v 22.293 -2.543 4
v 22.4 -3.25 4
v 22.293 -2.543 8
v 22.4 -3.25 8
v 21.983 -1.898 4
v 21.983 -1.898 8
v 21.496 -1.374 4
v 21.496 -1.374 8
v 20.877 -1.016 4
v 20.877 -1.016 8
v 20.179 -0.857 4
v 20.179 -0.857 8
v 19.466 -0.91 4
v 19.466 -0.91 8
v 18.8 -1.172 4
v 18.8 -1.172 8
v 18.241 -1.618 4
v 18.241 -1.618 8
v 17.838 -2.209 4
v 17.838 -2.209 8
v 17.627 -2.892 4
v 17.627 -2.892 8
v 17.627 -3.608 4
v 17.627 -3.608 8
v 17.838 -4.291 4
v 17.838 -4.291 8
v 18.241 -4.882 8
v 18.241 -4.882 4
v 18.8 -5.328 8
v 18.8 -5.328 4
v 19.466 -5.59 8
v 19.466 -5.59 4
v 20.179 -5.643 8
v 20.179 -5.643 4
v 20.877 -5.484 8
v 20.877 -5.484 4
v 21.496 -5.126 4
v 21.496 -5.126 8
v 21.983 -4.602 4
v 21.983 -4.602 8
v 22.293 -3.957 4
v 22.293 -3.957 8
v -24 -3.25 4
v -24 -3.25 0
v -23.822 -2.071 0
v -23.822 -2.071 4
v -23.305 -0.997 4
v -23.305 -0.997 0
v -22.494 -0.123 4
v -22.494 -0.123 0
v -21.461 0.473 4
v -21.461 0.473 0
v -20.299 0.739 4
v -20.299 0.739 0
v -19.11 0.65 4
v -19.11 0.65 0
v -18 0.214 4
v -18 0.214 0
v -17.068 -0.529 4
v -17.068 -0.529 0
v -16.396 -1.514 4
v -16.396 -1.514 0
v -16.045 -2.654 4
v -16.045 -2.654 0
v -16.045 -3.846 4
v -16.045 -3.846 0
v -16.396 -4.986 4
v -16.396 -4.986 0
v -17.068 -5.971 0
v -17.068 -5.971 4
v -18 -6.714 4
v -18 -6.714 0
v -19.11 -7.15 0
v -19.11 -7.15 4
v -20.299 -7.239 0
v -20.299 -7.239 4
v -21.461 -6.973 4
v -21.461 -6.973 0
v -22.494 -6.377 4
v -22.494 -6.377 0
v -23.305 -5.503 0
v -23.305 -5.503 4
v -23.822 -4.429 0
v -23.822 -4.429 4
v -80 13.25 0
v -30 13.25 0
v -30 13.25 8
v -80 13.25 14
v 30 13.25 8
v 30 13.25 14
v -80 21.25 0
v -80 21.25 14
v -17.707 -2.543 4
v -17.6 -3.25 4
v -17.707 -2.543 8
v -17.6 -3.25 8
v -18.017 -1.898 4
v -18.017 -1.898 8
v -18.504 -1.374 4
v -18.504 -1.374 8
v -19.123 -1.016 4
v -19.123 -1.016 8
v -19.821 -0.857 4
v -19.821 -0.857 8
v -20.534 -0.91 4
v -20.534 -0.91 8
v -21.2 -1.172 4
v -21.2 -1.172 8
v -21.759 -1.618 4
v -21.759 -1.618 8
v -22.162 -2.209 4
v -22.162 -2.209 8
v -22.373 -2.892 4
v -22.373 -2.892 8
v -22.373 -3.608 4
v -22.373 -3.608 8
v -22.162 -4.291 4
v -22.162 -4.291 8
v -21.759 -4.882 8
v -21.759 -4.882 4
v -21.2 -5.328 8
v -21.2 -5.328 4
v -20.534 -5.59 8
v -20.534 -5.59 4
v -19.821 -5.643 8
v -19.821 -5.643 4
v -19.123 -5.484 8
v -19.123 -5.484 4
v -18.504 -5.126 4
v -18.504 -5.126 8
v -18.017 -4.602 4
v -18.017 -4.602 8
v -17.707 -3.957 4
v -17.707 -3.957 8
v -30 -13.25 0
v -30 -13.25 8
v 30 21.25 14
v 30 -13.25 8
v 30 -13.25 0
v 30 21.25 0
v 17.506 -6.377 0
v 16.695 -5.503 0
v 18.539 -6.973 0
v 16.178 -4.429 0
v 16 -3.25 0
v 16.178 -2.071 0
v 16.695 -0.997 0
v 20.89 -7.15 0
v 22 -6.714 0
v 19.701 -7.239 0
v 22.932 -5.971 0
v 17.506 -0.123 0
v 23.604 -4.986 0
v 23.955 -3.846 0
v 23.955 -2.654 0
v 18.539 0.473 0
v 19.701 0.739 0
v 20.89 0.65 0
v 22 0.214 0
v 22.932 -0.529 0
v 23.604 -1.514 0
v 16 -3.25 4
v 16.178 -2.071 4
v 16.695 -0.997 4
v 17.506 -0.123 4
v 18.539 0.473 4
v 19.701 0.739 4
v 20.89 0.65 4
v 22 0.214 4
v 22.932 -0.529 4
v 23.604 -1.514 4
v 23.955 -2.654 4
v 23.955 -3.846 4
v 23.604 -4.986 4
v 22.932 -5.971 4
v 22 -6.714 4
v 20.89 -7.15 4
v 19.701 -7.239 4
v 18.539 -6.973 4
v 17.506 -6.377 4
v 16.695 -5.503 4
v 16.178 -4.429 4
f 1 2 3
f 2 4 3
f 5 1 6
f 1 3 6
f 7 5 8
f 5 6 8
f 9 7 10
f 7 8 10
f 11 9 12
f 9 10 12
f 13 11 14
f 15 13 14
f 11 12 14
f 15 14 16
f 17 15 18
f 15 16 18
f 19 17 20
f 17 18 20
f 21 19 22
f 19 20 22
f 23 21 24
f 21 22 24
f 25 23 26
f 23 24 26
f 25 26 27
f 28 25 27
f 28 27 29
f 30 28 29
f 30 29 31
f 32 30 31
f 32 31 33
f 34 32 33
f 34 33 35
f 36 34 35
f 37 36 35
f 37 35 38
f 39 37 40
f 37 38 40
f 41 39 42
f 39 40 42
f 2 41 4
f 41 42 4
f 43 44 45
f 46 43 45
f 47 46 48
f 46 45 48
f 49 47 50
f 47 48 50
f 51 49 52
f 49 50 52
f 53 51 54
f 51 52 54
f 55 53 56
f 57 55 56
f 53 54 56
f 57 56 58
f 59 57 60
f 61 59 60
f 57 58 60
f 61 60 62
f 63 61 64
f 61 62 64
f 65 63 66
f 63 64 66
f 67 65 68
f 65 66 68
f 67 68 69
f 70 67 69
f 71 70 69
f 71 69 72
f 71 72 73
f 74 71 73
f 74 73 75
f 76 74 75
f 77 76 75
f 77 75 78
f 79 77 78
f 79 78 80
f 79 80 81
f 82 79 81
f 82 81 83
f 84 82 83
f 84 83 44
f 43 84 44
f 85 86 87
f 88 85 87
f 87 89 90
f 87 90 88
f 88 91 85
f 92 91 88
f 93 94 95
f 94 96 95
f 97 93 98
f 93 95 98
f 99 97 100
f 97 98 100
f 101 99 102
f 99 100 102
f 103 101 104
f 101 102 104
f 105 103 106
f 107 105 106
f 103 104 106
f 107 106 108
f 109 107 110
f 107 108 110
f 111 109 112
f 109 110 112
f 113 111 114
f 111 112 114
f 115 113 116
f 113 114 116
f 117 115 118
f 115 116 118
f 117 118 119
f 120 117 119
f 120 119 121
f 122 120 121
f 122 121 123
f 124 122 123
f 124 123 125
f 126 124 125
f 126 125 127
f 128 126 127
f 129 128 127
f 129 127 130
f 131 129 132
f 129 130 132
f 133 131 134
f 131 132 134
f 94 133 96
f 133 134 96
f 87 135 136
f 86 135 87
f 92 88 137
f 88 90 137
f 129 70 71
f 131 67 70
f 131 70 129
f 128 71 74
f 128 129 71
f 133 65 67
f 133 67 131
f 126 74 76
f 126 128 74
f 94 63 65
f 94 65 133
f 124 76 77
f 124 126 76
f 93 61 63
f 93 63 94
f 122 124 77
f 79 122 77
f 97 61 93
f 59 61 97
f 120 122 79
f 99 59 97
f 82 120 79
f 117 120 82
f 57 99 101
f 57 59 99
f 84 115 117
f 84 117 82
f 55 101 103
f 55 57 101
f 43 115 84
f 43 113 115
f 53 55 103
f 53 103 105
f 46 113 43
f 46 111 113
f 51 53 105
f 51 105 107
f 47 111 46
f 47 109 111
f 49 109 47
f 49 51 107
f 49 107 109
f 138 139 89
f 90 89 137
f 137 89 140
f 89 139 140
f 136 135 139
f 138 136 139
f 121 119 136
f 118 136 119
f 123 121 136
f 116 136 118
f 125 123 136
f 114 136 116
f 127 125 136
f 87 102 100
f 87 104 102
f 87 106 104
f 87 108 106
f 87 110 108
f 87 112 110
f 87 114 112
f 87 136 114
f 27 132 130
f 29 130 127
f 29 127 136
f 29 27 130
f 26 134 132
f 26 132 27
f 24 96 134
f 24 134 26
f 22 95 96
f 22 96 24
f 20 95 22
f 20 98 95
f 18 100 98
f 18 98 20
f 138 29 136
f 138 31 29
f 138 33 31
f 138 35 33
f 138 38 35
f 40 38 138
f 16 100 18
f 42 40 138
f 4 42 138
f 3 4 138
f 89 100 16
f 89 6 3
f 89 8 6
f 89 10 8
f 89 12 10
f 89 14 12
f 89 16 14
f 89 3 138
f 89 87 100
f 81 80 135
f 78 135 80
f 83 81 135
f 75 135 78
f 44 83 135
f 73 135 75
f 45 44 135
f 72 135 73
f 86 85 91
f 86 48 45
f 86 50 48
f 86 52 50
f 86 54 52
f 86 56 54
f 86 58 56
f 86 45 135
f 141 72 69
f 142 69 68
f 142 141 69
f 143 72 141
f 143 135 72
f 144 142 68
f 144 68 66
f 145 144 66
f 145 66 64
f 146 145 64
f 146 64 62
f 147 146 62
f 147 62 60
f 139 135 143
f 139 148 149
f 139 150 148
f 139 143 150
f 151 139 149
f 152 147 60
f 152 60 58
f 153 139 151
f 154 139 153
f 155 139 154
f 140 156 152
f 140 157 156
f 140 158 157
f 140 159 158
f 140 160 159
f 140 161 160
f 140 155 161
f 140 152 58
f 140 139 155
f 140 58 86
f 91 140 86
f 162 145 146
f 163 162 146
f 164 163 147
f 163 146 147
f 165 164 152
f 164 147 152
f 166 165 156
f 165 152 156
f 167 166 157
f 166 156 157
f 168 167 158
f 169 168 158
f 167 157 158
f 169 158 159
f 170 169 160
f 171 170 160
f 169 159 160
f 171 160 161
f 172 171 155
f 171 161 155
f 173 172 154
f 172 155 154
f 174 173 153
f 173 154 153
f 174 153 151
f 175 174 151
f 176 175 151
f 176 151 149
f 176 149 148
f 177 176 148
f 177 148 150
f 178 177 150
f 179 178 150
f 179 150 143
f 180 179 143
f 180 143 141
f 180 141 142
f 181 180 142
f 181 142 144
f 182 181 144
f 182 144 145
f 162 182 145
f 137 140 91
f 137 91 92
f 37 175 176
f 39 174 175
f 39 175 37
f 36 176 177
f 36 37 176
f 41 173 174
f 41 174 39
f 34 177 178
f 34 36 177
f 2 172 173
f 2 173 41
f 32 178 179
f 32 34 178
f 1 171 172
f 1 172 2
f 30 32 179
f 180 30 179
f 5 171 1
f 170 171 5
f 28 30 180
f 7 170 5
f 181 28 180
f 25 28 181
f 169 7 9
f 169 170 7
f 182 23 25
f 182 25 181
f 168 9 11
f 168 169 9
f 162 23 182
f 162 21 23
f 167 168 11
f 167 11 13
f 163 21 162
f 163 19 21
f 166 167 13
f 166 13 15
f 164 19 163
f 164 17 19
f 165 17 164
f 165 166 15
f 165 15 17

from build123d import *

# Parameters (mm, degrees)
SKETCH_1_W                   = 60
SKETCH_1_H                   = 26.5
EXTRUDE_1_DEPTH              = 8
EXTRUDE_2_DEPTH              = 6
EXTRUDE_2_DEPTH_BACK         = 8
SKETCH_2_W                   = 60
SKETCH_2_H                   = 8
HOLE_WIZARD_M4_1_D           = 4.8
HOLE_WIZARD_M4_1_DEPTH       = 10.1
HOLE_WIZARD_M4_1_CBORE_D     = 8
HOLE_WIZARD_M4_1_CBORE_DEPTH = 4
HOLE_WIZARD_M4_1_TIP         = 1.442065486
SKETCH_7_W                   = 14
SKETCH_7_H                   = 8
EXTRUDE_3_DEPTH              = 50


with BuildPart() as part:
    # 스케치1 → 보스-돌출1 (new body)
    with BuildSketch(Plane.XY):
        Rectangle(SKETCH_1_W, SKETCH_1_H)
    extrude(amount=EXTRUDE_1_DEPTH)

    # 스케치2 → 보스-돌출2 (add, two sides: drawn at the far end of the back side and taken through both)
    with BuildSketch(Plane.XY.offset(8).offset(-EXTRUDE_2_DEPTH_BACK)):
        with Locations((0, 17.25)):
            Rectangle(SKETCH_2_W, SKETCH_2_H)
    extrude(amount=EXTRUDE_2_DEPTH + EXTRUDE_2_DEPTH_BACK)

    # M4 소켓 머리 캡 나사용 카운터보어1
    with Locations(Plane(origin=(0, 0, 0), x_dir=(-1, 0, 0), z_dir=(0, 0, -1))):
        with Locations((-20, -3.25), (20, -3.25)):
            CounterBoreHole(HOLE_WIZARD_M4_1_D / 2, HOLE_WIZARD_M4_1_CBORE_D / 2, HOLE_WIZARD_M4_1_CBORE_DEPTH, depth=HOLE_WIZARD_M4_1_DEPTH)
            with Locations((0, 0, -(HOLE_WIZARD_M4_1_DEPTH + HOLE_WIZARD_M4_1_TIP / 2))):  # 118° drill point
                Cone(0, HOLE_WIZARD_M4_1_D / 2, HOLE_WIZARD_M4_1_TIP, mode=Mode.SUBTRACT)

    # 스케치7 → 보스-돌출3 (add)
    with BuildSketch(Plane.ZY.offset(30)):
        with Locations((7, 17.25)):
            Rectangle(SKETCH_7_W, SKETCH_7_H)
    extrude(amount=EXTRUDE_3_DEPTH)


solid = part.part
